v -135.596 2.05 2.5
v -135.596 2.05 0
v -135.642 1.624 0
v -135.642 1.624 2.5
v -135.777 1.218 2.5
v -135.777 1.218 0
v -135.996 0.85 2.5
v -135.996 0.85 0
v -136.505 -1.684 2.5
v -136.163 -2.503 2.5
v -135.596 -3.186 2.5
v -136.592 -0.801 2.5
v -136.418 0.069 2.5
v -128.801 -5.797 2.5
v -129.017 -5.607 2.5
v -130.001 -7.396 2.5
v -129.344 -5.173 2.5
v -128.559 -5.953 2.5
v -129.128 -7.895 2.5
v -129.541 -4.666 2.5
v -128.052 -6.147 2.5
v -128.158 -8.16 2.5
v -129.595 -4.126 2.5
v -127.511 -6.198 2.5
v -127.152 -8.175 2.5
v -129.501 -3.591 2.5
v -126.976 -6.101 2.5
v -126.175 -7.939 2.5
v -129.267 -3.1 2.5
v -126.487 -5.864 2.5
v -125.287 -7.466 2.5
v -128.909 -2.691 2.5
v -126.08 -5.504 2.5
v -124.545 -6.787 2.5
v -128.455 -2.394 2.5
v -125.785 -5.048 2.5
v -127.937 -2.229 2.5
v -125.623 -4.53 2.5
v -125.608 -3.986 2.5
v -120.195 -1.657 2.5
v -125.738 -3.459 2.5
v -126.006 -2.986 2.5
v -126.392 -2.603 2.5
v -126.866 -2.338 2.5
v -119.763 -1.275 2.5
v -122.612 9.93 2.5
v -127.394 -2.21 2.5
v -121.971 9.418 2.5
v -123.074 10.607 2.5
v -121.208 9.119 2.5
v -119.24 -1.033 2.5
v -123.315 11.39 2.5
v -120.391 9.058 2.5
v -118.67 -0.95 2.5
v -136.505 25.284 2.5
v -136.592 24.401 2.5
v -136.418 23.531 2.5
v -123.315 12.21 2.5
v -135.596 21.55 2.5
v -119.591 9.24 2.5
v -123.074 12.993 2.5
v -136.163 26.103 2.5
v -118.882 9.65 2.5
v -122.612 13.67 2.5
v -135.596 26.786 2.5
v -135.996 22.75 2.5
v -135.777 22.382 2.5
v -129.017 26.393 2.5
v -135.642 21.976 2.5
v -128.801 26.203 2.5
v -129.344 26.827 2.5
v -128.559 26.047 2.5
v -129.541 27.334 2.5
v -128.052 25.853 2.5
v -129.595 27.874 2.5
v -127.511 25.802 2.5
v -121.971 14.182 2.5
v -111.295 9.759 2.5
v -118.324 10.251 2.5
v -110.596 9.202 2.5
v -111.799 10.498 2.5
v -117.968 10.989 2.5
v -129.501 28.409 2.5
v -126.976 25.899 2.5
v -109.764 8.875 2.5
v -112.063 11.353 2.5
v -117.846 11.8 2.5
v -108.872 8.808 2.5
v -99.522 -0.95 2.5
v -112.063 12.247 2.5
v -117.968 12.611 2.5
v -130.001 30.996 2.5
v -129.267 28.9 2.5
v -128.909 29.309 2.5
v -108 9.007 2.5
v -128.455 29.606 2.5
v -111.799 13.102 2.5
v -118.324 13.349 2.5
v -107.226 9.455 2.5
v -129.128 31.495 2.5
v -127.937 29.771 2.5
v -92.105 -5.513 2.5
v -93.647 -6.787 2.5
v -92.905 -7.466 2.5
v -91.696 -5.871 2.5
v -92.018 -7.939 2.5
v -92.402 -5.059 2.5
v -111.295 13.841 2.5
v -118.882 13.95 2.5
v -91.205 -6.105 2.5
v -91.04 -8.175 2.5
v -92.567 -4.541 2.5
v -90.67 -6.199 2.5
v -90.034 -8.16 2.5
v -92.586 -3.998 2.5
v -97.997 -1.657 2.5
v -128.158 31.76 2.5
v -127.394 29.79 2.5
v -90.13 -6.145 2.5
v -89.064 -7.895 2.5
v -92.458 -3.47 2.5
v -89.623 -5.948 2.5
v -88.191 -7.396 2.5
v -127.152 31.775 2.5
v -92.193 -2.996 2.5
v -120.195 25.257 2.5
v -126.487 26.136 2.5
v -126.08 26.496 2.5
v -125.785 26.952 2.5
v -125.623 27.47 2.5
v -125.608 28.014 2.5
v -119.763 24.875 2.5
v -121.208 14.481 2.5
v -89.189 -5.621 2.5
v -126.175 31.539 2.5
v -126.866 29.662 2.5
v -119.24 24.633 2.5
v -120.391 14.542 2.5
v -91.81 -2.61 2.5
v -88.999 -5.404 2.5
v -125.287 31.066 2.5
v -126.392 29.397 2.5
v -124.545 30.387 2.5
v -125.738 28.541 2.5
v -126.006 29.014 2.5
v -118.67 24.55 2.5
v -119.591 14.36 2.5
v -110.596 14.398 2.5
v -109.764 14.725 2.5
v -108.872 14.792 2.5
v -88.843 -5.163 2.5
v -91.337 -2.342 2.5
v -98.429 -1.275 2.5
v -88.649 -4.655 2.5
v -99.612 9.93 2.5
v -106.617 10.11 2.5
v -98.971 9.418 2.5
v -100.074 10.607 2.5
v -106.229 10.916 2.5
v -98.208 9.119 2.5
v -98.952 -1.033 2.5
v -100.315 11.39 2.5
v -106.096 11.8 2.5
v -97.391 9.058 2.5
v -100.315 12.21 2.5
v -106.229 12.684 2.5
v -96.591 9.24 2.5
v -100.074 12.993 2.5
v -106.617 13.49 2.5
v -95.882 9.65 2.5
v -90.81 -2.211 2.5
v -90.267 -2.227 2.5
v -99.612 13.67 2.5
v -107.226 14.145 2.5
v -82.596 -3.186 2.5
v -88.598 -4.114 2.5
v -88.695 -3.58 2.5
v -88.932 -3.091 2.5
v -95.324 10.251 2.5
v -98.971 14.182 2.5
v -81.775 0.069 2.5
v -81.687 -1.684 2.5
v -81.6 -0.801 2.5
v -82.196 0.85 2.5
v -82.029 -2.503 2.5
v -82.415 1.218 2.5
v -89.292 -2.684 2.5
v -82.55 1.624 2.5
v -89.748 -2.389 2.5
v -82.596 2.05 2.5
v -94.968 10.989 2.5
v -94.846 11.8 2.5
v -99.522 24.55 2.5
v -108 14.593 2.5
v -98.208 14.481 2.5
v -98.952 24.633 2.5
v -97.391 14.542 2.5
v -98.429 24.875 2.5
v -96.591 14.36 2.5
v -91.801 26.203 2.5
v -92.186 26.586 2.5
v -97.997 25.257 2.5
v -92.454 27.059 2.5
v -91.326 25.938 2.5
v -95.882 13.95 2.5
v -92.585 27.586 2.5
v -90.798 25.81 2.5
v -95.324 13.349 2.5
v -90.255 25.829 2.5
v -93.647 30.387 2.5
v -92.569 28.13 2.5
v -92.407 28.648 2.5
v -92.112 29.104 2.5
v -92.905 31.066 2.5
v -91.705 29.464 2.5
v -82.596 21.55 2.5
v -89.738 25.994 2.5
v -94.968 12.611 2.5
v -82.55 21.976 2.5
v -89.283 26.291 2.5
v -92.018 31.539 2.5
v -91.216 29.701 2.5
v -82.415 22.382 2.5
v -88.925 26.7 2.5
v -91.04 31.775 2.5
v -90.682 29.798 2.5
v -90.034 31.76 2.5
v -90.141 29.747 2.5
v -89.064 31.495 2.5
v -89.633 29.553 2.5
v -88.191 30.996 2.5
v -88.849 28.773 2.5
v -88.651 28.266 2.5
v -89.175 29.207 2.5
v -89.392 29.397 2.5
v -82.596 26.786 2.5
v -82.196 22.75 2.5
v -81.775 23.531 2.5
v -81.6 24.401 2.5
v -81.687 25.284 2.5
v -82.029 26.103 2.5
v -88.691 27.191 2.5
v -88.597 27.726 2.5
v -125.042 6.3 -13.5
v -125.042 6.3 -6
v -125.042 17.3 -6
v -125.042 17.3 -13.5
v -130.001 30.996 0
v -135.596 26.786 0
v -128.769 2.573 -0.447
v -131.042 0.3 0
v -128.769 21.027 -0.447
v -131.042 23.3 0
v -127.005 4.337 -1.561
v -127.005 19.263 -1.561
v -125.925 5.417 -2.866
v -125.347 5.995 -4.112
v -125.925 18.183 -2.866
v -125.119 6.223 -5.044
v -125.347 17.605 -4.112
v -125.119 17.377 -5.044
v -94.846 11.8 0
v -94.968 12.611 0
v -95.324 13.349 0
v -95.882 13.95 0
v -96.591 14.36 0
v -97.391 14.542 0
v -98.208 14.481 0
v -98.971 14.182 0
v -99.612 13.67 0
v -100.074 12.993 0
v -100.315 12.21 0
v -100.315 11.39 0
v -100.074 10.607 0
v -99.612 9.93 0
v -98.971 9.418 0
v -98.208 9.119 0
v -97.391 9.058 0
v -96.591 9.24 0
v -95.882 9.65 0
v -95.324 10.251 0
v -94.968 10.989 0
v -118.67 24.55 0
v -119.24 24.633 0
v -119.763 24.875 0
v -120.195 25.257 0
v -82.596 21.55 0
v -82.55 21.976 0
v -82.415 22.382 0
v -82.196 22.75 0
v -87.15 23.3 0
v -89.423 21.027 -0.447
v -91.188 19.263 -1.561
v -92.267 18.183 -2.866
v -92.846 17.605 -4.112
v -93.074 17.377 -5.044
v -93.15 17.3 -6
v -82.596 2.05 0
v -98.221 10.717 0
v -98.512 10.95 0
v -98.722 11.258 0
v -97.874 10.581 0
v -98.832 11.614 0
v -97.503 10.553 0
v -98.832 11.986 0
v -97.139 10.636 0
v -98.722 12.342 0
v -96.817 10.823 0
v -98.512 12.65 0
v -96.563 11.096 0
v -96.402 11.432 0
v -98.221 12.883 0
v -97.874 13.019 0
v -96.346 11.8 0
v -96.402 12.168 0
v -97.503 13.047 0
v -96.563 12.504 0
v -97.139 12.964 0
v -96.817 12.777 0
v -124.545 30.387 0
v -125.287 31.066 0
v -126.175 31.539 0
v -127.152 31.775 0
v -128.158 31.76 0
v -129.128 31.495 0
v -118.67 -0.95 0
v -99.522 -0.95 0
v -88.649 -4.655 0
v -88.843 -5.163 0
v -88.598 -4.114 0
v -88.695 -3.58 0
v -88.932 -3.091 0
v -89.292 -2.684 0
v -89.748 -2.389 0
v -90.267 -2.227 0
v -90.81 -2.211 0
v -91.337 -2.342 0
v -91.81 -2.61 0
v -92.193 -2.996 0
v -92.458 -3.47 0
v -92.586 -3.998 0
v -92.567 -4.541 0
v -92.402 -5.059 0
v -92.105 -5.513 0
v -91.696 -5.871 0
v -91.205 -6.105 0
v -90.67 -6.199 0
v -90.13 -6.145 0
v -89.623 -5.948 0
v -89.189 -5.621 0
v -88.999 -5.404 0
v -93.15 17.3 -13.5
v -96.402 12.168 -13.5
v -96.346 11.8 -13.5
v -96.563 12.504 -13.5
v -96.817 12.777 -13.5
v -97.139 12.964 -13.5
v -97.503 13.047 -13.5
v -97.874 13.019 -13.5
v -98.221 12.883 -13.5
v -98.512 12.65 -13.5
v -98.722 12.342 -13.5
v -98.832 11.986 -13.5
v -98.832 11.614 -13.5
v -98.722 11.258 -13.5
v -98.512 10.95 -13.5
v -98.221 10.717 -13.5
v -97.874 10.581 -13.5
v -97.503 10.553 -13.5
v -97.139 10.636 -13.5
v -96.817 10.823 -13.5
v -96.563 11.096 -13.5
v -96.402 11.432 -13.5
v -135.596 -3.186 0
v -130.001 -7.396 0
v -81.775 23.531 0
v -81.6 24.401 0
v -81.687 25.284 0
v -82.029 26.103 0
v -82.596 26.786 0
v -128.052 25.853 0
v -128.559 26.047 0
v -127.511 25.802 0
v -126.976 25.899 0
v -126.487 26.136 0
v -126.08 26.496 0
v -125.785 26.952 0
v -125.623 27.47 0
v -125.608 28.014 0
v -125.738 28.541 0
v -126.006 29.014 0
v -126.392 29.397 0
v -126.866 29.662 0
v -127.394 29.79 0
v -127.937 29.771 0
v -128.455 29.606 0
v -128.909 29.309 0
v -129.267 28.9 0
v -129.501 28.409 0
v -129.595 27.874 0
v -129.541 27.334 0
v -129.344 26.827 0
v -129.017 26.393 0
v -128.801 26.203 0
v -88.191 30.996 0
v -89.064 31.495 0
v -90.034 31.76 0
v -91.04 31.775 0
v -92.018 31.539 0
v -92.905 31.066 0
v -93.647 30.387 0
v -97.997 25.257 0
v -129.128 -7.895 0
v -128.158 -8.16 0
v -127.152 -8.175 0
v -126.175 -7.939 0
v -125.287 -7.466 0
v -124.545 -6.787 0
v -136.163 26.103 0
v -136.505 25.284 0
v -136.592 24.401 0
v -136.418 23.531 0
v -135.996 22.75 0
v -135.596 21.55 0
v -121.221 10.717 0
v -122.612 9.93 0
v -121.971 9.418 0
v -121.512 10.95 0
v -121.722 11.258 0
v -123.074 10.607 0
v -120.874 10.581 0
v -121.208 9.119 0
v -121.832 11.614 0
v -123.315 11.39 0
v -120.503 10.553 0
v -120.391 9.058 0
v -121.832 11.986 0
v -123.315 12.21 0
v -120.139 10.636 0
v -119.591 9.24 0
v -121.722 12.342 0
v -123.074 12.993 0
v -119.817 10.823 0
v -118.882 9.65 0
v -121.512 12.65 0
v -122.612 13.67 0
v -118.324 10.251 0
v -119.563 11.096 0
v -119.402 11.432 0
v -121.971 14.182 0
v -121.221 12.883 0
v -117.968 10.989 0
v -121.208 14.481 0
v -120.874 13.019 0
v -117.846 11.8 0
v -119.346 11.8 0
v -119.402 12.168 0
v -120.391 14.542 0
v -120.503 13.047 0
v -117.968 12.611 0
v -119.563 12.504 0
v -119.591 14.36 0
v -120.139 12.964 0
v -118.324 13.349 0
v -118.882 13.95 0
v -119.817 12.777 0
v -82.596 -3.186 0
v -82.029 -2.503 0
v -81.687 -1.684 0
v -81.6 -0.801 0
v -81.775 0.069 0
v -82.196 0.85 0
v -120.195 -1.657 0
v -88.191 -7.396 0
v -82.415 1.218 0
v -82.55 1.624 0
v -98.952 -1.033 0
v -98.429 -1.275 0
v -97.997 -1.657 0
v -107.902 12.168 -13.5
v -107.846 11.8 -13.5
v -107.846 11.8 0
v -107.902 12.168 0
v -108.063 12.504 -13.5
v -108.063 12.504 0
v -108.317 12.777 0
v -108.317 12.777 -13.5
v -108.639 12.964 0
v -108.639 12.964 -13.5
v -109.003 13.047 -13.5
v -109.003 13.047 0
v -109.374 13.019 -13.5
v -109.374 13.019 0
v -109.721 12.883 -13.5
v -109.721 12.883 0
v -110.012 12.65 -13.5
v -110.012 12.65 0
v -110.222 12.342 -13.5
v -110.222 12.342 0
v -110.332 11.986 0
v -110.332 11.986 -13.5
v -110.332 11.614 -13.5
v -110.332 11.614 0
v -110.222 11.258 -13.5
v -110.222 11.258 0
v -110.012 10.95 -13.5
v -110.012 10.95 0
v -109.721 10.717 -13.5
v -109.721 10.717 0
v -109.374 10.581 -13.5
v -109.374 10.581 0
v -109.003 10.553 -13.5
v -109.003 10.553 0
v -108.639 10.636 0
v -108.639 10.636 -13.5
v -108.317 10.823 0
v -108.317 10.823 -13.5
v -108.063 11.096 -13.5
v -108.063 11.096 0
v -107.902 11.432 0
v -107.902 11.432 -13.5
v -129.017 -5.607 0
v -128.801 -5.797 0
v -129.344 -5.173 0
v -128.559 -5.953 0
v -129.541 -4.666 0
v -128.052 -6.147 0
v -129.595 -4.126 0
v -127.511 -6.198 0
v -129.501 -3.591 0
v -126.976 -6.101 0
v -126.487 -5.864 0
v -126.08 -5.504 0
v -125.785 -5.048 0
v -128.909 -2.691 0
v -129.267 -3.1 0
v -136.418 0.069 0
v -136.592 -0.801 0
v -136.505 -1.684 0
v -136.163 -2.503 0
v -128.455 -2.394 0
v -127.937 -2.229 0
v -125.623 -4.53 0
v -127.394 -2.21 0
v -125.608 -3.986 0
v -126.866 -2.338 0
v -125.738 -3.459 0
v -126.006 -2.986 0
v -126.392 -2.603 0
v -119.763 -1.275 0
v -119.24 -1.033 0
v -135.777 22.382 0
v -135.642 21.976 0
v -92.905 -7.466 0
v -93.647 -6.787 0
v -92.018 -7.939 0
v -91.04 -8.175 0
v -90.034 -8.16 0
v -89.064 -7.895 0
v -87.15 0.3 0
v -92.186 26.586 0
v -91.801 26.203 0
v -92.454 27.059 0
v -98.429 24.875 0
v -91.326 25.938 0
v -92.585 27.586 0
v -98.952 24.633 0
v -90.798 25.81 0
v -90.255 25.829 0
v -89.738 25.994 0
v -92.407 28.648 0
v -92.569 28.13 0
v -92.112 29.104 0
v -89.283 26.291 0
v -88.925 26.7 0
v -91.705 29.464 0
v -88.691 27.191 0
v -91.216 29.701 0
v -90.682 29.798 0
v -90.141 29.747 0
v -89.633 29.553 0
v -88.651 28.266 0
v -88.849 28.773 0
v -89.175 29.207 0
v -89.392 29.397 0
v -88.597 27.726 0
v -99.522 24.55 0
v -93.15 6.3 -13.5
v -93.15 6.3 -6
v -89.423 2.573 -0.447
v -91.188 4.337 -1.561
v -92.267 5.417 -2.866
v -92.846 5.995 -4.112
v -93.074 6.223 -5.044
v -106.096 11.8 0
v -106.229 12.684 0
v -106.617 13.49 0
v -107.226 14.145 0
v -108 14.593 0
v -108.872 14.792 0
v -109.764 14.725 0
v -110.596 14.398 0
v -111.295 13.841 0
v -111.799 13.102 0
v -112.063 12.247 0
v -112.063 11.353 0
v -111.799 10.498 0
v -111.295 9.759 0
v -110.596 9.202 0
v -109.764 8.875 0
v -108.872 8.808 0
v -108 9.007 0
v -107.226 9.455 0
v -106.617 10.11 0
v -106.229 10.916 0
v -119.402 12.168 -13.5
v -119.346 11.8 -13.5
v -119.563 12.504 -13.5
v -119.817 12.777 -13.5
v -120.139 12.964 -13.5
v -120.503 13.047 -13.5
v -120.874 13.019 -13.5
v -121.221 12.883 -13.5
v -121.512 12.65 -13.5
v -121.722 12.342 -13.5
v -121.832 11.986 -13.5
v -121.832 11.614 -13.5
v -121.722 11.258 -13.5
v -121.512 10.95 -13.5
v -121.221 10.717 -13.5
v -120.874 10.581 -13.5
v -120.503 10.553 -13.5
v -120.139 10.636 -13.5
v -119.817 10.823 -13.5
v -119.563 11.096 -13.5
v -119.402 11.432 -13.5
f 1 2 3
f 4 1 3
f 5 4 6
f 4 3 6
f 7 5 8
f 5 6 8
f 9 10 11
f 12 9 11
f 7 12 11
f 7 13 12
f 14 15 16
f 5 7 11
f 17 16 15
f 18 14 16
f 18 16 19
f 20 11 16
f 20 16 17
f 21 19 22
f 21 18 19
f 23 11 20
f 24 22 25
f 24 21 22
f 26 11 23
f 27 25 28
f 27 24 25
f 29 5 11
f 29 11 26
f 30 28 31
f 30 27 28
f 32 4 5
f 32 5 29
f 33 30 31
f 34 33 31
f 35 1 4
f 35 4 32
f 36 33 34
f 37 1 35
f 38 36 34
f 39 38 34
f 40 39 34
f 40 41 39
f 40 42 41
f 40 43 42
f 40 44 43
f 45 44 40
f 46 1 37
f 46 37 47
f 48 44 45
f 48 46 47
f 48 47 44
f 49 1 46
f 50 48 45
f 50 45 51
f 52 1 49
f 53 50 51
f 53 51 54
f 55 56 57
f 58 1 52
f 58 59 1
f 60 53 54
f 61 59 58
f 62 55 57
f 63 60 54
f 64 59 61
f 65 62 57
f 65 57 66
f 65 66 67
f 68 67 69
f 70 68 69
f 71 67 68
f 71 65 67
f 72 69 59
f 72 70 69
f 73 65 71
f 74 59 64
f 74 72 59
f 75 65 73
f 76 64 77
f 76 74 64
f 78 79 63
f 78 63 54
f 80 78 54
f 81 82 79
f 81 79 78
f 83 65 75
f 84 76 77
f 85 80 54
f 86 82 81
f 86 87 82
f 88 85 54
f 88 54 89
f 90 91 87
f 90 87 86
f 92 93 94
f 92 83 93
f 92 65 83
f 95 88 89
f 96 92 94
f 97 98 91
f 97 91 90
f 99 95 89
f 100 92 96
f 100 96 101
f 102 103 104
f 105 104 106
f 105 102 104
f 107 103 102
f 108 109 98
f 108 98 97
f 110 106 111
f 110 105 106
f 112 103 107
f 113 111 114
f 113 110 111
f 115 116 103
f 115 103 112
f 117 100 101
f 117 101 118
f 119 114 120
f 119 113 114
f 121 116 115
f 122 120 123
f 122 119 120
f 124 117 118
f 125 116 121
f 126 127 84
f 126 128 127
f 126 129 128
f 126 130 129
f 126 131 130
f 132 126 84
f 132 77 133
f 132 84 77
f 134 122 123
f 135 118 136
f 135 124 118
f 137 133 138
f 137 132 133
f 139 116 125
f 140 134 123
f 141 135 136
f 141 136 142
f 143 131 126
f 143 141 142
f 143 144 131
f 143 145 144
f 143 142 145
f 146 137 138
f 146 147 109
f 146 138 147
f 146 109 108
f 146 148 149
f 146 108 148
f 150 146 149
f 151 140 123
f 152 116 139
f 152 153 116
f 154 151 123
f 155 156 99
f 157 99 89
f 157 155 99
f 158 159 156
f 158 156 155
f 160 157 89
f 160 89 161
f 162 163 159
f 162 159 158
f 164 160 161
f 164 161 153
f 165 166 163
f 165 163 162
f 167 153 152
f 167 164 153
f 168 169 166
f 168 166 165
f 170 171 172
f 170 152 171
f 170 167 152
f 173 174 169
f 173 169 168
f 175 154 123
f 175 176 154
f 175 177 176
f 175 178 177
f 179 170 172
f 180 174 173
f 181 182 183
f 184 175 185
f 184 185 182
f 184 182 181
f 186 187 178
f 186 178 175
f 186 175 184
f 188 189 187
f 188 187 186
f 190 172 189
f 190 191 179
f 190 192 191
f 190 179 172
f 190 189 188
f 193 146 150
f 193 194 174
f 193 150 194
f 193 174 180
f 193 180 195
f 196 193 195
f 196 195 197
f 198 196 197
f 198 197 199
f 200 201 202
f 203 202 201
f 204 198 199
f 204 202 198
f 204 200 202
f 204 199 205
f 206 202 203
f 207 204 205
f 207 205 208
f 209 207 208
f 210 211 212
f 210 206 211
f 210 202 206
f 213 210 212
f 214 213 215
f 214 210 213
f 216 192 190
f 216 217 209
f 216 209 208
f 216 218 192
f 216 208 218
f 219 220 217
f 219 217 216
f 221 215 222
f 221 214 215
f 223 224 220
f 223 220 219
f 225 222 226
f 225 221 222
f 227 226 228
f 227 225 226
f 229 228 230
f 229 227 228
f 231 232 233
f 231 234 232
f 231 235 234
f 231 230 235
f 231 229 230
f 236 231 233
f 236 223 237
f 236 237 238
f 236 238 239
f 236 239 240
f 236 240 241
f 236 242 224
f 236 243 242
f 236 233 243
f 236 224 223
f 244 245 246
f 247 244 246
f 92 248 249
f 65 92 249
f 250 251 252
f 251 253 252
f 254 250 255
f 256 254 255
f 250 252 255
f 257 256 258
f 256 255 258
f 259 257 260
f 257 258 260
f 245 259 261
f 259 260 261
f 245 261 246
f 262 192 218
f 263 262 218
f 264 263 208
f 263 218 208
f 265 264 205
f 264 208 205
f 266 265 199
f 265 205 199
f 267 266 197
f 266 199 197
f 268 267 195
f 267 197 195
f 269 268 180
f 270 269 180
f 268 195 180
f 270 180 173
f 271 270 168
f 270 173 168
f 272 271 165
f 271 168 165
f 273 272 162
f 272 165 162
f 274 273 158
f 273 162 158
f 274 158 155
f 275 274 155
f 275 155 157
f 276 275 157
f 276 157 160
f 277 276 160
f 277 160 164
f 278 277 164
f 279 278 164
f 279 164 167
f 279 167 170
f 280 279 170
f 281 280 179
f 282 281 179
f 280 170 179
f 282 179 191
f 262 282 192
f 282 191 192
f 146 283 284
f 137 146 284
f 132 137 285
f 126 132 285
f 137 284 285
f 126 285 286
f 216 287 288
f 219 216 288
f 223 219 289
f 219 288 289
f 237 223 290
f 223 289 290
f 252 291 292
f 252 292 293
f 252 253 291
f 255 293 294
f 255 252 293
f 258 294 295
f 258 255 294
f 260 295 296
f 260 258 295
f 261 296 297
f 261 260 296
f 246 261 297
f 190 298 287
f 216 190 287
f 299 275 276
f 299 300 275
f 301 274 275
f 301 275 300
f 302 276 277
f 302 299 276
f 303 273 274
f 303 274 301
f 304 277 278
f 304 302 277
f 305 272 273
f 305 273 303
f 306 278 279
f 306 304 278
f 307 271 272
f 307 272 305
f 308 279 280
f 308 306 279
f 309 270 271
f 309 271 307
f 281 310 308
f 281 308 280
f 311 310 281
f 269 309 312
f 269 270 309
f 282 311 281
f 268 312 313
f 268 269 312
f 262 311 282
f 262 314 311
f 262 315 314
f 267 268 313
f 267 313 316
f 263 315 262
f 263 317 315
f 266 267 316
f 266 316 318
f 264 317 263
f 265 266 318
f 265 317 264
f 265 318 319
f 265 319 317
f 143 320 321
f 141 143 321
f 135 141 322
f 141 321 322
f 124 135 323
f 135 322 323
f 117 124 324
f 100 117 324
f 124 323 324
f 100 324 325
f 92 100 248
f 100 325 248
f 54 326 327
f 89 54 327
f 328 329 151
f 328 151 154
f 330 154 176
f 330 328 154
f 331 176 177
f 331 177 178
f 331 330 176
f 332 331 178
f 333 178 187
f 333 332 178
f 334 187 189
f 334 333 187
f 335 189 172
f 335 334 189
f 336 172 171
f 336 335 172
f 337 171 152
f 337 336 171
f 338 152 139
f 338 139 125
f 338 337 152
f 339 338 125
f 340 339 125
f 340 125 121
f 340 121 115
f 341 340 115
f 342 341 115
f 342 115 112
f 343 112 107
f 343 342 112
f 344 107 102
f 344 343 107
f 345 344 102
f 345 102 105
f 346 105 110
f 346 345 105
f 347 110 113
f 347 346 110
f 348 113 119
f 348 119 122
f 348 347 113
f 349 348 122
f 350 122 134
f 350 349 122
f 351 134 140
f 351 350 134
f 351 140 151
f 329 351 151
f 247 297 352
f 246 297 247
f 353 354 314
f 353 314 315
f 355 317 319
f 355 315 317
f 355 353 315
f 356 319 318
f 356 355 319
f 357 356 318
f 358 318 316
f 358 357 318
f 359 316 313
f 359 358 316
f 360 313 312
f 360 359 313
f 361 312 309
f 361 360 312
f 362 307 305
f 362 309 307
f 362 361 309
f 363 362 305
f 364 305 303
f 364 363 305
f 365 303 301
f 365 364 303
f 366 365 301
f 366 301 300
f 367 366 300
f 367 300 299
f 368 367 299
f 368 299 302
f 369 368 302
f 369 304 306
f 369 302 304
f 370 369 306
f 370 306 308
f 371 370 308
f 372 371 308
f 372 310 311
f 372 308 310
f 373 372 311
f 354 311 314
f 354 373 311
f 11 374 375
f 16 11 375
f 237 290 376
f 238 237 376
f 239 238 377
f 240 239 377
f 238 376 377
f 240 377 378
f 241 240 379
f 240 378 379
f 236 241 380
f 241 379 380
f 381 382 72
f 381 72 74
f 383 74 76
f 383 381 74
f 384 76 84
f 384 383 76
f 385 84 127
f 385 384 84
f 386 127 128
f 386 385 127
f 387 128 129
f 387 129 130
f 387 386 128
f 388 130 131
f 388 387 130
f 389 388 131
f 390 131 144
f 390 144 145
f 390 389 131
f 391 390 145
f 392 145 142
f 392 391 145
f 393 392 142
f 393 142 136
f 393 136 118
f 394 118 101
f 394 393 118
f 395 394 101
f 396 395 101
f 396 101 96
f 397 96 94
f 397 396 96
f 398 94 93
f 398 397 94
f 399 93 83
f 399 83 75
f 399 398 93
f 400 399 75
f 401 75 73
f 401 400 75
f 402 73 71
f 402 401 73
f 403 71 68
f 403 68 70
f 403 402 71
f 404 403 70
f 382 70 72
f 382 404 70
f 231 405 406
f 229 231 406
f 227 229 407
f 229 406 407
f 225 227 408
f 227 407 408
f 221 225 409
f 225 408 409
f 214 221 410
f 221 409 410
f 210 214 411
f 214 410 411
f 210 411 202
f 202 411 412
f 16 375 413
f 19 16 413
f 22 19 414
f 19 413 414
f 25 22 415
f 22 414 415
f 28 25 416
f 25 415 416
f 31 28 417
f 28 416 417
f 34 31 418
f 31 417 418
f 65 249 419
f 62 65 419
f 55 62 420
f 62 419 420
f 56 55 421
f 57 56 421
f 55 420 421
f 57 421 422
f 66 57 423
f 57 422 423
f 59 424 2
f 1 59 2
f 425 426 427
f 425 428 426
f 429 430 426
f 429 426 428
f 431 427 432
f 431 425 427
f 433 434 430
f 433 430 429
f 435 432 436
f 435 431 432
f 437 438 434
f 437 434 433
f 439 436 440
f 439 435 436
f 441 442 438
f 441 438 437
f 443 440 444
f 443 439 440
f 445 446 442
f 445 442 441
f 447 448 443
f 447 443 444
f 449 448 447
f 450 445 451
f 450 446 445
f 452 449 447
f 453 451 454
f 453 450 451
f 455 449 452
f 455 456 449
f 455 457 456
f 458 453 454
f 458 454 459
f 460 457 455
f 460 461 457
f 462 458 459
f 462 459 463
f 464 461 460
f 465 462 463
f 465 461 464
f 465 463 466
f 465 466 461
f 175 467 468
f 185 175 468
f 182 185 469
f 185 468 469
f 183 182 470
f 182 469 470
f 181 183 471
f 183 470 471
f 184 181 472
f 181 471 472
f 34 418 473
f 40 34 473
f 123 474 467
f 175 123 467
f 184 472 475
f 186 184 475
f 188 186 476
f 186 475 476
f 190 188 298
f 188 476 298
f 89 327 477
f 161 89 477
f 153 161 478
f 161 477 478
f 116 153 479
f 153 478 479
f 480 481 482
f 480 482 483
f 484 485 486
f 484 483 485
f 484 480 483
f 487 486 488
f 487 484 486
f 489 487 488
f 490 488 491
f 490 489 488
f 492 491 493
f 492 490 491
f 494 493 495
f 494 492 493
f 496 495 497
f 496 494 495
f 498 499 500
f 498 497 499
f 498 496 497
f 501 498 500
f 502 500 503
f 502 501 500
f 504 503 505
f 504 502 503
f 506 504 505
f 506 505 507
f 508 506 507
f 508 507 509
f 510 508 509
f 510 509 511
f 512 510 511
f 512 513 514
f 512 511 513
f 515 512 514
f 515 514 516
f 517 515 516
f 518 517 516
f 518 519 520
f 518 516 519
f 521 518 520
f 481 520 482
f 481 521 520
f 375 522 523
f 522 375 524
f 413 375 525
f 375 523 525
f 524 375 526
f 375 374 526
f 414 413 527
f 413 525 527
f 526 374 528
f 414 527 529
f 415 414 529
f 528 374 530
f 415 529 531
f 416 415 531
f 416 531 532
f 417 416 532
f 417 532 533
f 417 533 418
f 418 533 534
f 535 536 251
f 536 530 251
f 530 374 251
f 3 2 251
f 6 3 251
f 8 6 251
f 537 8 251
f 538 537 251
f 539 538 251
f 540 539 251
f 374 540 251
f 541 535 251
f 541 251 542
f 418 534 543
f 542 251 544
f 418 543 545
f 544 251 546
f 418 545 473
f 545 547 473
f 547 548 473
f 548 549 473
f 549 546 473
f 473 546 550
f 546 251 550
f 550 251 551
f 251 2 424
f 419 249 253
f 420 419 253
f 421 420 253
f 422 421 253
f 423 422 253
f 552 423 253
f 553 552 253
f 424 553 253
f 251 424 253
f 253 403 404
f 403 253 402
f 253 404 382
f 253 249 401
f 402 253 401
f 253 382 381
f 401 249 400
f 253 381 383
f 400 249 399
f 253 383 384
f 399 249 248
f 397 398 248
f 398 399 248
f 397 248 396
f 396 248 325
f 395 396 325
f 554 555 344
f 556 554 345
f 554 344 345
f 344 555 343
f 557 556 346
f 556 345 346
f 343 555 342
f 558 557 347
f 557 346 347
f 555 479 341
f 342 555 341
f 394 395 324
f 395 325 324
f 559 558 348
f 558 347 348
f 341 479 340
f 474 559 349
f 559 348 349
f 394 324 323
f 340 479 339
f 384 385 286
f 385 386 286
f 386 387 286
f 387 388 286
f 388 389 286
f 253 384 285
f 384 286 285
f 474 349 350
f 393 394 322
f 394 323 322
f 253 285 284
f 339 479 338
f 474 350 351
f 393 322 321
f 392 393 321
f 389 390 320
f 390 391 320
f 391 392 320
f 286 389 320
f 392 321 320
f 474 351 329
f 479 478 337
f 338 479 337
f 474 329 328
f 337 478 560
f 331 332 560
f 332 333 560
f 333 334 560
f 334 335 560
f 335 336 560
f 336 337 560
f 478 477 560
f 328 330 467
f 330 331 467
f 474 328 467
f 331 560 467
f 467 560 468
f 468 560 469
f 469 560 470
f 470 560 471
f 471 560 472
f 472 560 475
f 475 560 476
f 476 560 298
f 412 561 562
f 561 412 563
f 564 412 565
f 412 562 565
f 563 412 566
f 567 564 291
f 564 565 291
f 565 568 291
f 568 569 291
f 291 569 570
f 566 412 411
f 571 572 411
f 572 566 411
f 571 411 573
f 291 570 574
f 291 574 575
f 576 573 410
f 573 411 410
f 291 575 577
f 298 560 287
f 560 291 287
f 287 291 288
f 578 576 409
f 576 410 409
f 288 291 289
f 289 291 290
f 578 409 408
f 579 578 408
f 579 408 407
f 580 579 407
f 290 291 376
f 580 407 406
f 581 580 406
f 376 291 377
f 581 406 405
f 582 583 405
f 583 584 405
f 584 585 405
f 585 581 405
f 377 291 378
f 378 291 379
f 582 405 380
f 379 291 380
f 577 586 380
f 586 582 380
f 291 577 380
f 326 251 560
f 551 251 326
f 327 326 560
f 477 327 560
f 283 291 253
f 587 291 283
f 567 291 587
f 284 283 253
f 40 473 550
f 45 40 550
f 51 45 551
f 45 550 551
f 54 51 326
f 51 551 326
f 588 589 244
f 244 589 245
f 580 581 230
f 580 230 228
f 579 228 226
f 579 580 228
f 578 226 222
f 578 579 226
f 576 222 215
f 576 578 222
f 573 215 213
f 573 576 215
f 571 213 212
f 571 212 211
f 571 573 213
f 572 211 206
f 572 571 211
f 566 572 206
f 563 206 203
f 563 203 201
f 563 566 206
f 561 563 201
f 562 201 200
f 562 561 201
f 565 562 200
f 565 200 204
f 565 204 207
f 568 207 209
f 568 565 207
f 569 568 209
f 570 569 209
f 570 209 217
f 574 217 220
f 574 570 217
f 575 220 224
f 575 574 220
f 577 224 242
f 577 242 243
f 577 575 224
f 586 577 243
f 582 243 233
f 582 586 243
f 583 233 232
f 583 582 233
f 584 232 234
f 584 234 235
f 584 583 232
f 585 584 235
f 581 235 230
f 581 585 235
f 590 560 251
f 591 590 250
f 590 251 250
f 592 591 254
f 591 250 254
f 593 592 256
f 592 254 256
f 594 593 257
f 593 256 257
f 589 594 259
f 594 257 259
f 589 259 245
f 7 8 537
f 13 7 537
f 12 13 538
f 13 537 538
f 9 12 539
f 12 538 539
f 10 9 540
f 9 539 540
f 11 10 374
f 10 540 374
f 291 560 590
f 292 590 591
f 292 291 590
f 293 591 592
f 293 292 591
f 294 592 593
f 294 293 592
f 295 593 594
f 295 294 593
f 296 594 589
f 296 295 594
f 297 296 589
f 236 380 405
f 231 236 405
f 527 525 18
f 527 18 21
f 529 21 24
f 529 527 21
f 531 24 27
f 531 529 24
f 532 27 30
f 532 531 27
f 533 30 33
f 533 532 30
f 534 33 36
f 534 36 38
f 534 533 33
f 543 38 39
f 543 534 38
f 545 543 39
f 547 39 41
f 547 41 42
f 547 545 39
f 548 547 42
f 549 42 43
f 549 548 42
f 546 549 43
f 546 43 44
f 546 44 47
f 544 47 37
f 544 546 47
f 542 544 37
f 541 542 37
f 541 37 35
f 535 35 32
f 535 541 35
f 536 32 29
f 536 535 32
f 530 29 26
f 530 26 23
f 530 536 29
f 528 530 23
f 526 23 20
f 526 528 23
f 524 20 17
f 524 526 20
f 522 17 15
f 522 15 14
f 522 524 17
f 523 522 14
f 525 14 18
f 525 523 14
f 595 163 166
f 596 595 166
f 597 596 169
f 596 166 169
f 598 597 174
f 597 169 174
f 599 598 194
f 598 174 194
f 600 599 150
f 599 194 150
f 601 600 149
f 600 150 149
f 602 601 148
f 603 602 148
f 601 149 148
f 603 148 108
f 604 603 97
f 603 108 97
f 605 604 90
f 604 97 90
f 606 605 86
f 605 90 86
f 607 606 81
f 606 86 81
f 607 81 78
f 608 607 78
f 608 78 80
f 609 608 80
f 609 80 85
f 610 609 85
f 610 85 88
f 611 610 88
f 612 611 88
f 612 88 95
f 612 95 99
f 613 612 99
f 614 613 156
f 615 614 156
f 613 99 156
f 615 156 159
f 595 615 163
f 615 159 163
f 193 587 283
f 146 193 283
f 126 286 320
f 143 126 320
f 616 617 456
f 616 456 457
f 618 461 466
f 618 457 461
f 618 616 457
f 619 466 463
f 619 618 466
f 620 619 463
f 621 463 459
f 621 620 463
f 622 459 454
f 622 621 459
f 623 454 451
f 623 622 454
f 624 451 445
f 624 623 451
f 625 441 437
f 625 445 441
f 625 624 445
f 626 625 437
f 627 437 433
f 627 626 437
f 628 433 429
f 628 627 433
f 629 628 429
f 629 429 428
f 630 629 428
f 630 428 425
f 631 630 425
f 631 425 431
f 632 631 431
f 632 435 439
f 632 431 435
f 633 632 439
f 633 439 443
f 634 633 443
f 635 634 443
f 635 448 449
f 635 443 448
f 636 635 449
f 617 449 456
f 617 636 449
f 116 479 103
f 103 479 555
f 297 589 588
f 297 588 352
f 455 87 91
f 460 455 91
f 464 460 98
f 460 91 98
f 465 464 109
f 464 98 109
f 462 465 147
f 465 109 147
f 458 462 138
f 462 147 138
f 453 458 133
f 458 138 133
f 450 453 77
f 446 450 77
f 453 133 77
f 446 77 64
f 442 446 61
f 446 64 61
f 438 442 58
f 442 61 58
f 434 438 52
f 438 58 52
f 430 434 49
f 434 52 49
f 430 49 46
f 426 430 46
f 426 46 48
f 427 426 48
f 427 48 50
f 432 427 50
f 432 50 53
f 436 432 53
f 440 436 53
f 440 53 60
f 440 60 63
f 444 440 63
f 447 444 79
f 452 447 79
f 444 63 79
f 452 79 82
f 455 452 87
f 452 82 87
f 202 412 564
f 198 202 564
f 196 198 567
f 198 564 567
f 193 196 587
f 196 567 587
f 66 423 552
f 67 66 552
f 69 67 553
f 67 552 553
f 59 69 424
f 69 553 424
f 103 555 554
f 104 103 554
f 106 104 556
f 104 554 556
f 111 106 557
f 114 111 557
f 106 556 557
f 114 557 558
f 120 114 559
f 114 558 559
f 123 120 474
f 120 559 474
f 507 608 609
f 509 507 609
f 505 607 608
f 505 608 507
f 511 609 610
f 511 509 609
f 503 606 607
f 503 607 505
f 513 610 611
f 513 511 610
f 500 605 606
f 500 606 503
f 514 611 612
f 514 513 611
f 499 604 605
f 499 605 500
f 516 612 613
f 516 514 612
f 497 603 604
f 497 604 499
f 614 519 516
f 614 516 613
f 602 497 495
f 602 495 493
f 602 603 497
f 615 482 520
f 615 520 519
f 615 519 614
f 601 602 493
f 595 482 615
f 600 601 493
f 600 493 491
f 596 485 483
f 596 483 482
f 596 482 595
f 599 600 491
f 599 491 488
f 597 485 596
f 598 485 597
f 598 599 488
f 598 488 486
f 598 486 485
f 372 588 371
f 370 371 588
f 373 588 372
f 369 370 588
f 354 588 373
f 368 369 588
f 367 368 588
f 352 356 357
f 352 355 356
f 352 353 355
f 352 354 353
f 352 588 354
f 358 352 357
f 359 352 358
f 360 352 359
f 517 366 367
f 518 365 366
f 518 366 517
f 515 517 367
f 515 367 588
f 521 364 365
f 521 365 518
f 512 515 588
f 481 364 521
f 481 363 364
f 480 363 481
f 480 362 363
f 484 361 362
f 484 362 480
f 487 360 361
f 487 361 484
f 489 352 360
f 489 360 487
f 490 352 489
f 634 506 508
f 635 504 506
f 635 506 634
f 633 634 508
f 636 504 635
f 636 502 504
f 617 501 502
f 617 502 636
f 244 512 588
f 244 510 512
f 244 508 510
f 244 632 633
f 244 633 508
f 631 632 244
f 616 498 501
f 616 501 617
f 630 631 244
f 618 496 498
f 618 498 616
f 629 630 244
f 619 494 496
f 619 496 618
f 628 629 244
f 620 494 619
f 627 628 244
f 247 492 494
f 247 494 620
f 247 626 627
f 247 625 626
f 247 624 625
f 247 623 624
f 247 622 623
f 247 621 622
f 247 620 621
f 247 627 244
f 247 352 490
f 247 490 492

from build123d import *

# Parameters (mm, degrees)
SKETCH1_RX              = 2
SKETCH1_RY              = 2
BOSS_EXTRUDE1_DEPTH     = 2.5
SKETCH14_W              = 31.891524792
SKETCH14_H              = 10.99995058
BOSS_EXTRUDE9_DEPTH     = 13.5
CUT_EXTRUDE2_DEPTH      = 142.15856284
CUT_EXTRUDE2_DEPTH_BACK = 142.15856284
SKETCH12_R              = 1.25
FILLET9_R               = 6
SKETCH15_R              = 2.75
SKETCH15_R_2            = 3
CUT_EXTRUDE3_DEPTH      = 2.5


with BuildPart() as part:
    # Sketch1 → Boss-Extrude1 (new body)
    with BuildSketch(Plane.XY):
        with BuildLine():
            Line((-97.997023968, -1.656563984), (-93.647036265, -6.786872031))
            ThreePointArc((-93.647036265, -6.786872031), (-91.040064157, -8.175287806), (-88.191031172, -7.396177424))
            Line((-88.191031172, -7.396177424), (-82.596119502, -3.186067977))
            ThreePointArc((-82.596119502, -3.186067977), (-81.610744956, -1.2458696), (-82.196119502, 0.85))
            ThreePointArc((-82.196119502, 0.85), (-82.493486098, 1.417544468), (-82.596119502, 2.05))
            Line((-82.596119502, 2.05), (-82.596119502, 21.55))
            ThreePointArc((-82.596119502, 21.55), (-82.493486098, 22.182455532), (-82.196119502, 22.75))
            ThreePointArc((-82.196119502, 22.75), (-81.610744956, 24.8458696), (-82.596119502, 26.786067977))
            Line((-82.596119502, 26.786067977), (-88.191031172, 30.996177424))
            ThreePointArc((-88.191031172, 30.996177424), (-91.040064157, 31.775287806), (-93.647036265, 30.386872031))
            Line((-93.647036265, 30.386872031), (-97.997023968, 25.256563984))
            ThreePointArc((-97.997023968, 25.256563984), (-98.681908745, 24.735217364), (-99.522482349, 24.55))
            Line((-99.522482349, 24.55), (-118.669756656, 24.55))
            ThreePointArc((-118.669756656, 24.55), (-119.51033026, 24.735217364), (-120.195215037, 25.256563984))
            Line((-120.195215037, 25.256563984), (-124.54520274, 30.386872031))
            ThreePointArc((-124.54520274, 30.386872031), (-127.152174848, 31.775287806), (-130.001207832, 30.996177424))
            Line((-130.001207832, 30.996177424), (-135.596119502, 26.786067977))
            ThreePointArc((-135.596119502, 26.786067977), (-136.581494048, 24.8458696), (-135.996119502, 22.75))
            ThreePointArc((-135.996119502, 22.75), (-135.698752906, 22.182455532), (-135.596119502, 21.55))
            Line((-135.596119502, 21.55), (-135.596119502, 2.05))
            ThreePointArc((-135.596119502, 2.05), (-135.698752906, 1.417544468), (-135.996119502, 0.85))
            ThreePointArc((-135.996119502, 0.85), (-136.581494048, -1.2458696), (-135.596119502, -3.186067977))
            Line((-135.596119502, -3.186067977), (-130.001207832, -7.396177424))
            ThreePointArc((-130.001207832, -7.396177424), (-127.152174848, -8.175287806), (-124.54520274, -6.786872031))
            Line((-124.54520274, -6.786872031), (-120.195215037, -1.656563984))
            ThreePointArc((-120.195215037, -1.656563984), (-119.51033026, -1.135217364), (-118.669756656, -0.95))
            Line((-118.669756656, -0.95), (-99.522482349, -0.95))
            ThreePointArc((-99.522482349, -0.95), (-98.681908745, -1.135217364), (-97.997023968, -1.656563984))
        make_face()
        with Locations(Location((-90.596119502, 27.8), (0, 0, 61.223751036))):
            Ellipse(SKETCH1_RX, SKETCH1_RY, mode=Mode.SUBTRACT)
        with Locations(Location((-127.596119502, 27.8), (0, 0, -118.776248964))):
            Ellipse(SKETCH1_RX, SKETCH1_RY, mode=Mode.SUBTRACT)
        with Locations(Location((-127.596119502, -4.2), (0, 0, -118.776248964))):
            Ellipse(SKETCH1_RX, SKETCH1_RY, mode=Mode.SUBTRACT)
        with Locations(Location((-90.596119502, -4.2), (0, 0, -28.776248964))):
            Ellipse(SKETCH1_RX, SKETCH1_RY, mode=Mode.SUBTRACT)
    extrude(amount=BOSS_EXTRUDE1_DEPTH)

    # Sketch14 → Boss-Extrude9 (add)
    with BuildSketch(Plane(origin=(0, 0, 0), x_dir=(-1, 0, 0), z_dir=(0, 0, -1))):
        with Locations((109.096119502, 11.8)):
            Rectangle(SKETCH14_W, SKETCH14_H)
    extrude(amount=BOSS_EXTRUDE9_DEPTH)

    # Sketch12 → Cut-Extrude2 (cut, two sides: drawn at the far end of the back side and taken through both)
    with BuildSketch(Plane.XY.offset(2.5).offset(-CUT_EXTRUDE2_DEPTH_BACK)):
        with Locations((-97.596119502, 11.8)):
            Circle(SKETCH12_R)
        with Locations((-120.596119502, 11.8)):
            Circle(SKETCH12_R)
        with Locations((-109.096119502, 11.8)):
            Circle(SKETCH12_R)
    extrude(amount=CUT_EXTRUDE2_DEPTH + CUT_EXTRUDE2_DEPTH_BACK, mode=Mode.SUBTRACT)

    # Fillet9
    fillet9_edges = [part.edges().sort_by_distance(p)[0] for p in [
        (-93.150357106, 11.8, 0),
        (-109.096119502, 6.30002471, 0),
        (-125.041881898, 11.8, 0),
        (-109.096119502, 17.29997529, 0),
    ]]
    fillet(fillet9_edges, radius=FILLET9_R)

    # Sketch15 → Cut-Extrude3 (cut)
    with BuildSketch(Plane.XY.offset(2.5)):
        with Locations((-120.596119502, 11.8)):
            Circle(SKETCH15_R)
        with Locations((-109.096119502, 11.8)):
            Circle(SKETCH15_R_2)
        with Locations((-97.596119502, 11.8)):
            Circle(SKETCH15_R)
    extrude(amount=-CUT_EXTRUDE3_DEPTH, mode=Mode.SUBTRACT)


solid = part.part
